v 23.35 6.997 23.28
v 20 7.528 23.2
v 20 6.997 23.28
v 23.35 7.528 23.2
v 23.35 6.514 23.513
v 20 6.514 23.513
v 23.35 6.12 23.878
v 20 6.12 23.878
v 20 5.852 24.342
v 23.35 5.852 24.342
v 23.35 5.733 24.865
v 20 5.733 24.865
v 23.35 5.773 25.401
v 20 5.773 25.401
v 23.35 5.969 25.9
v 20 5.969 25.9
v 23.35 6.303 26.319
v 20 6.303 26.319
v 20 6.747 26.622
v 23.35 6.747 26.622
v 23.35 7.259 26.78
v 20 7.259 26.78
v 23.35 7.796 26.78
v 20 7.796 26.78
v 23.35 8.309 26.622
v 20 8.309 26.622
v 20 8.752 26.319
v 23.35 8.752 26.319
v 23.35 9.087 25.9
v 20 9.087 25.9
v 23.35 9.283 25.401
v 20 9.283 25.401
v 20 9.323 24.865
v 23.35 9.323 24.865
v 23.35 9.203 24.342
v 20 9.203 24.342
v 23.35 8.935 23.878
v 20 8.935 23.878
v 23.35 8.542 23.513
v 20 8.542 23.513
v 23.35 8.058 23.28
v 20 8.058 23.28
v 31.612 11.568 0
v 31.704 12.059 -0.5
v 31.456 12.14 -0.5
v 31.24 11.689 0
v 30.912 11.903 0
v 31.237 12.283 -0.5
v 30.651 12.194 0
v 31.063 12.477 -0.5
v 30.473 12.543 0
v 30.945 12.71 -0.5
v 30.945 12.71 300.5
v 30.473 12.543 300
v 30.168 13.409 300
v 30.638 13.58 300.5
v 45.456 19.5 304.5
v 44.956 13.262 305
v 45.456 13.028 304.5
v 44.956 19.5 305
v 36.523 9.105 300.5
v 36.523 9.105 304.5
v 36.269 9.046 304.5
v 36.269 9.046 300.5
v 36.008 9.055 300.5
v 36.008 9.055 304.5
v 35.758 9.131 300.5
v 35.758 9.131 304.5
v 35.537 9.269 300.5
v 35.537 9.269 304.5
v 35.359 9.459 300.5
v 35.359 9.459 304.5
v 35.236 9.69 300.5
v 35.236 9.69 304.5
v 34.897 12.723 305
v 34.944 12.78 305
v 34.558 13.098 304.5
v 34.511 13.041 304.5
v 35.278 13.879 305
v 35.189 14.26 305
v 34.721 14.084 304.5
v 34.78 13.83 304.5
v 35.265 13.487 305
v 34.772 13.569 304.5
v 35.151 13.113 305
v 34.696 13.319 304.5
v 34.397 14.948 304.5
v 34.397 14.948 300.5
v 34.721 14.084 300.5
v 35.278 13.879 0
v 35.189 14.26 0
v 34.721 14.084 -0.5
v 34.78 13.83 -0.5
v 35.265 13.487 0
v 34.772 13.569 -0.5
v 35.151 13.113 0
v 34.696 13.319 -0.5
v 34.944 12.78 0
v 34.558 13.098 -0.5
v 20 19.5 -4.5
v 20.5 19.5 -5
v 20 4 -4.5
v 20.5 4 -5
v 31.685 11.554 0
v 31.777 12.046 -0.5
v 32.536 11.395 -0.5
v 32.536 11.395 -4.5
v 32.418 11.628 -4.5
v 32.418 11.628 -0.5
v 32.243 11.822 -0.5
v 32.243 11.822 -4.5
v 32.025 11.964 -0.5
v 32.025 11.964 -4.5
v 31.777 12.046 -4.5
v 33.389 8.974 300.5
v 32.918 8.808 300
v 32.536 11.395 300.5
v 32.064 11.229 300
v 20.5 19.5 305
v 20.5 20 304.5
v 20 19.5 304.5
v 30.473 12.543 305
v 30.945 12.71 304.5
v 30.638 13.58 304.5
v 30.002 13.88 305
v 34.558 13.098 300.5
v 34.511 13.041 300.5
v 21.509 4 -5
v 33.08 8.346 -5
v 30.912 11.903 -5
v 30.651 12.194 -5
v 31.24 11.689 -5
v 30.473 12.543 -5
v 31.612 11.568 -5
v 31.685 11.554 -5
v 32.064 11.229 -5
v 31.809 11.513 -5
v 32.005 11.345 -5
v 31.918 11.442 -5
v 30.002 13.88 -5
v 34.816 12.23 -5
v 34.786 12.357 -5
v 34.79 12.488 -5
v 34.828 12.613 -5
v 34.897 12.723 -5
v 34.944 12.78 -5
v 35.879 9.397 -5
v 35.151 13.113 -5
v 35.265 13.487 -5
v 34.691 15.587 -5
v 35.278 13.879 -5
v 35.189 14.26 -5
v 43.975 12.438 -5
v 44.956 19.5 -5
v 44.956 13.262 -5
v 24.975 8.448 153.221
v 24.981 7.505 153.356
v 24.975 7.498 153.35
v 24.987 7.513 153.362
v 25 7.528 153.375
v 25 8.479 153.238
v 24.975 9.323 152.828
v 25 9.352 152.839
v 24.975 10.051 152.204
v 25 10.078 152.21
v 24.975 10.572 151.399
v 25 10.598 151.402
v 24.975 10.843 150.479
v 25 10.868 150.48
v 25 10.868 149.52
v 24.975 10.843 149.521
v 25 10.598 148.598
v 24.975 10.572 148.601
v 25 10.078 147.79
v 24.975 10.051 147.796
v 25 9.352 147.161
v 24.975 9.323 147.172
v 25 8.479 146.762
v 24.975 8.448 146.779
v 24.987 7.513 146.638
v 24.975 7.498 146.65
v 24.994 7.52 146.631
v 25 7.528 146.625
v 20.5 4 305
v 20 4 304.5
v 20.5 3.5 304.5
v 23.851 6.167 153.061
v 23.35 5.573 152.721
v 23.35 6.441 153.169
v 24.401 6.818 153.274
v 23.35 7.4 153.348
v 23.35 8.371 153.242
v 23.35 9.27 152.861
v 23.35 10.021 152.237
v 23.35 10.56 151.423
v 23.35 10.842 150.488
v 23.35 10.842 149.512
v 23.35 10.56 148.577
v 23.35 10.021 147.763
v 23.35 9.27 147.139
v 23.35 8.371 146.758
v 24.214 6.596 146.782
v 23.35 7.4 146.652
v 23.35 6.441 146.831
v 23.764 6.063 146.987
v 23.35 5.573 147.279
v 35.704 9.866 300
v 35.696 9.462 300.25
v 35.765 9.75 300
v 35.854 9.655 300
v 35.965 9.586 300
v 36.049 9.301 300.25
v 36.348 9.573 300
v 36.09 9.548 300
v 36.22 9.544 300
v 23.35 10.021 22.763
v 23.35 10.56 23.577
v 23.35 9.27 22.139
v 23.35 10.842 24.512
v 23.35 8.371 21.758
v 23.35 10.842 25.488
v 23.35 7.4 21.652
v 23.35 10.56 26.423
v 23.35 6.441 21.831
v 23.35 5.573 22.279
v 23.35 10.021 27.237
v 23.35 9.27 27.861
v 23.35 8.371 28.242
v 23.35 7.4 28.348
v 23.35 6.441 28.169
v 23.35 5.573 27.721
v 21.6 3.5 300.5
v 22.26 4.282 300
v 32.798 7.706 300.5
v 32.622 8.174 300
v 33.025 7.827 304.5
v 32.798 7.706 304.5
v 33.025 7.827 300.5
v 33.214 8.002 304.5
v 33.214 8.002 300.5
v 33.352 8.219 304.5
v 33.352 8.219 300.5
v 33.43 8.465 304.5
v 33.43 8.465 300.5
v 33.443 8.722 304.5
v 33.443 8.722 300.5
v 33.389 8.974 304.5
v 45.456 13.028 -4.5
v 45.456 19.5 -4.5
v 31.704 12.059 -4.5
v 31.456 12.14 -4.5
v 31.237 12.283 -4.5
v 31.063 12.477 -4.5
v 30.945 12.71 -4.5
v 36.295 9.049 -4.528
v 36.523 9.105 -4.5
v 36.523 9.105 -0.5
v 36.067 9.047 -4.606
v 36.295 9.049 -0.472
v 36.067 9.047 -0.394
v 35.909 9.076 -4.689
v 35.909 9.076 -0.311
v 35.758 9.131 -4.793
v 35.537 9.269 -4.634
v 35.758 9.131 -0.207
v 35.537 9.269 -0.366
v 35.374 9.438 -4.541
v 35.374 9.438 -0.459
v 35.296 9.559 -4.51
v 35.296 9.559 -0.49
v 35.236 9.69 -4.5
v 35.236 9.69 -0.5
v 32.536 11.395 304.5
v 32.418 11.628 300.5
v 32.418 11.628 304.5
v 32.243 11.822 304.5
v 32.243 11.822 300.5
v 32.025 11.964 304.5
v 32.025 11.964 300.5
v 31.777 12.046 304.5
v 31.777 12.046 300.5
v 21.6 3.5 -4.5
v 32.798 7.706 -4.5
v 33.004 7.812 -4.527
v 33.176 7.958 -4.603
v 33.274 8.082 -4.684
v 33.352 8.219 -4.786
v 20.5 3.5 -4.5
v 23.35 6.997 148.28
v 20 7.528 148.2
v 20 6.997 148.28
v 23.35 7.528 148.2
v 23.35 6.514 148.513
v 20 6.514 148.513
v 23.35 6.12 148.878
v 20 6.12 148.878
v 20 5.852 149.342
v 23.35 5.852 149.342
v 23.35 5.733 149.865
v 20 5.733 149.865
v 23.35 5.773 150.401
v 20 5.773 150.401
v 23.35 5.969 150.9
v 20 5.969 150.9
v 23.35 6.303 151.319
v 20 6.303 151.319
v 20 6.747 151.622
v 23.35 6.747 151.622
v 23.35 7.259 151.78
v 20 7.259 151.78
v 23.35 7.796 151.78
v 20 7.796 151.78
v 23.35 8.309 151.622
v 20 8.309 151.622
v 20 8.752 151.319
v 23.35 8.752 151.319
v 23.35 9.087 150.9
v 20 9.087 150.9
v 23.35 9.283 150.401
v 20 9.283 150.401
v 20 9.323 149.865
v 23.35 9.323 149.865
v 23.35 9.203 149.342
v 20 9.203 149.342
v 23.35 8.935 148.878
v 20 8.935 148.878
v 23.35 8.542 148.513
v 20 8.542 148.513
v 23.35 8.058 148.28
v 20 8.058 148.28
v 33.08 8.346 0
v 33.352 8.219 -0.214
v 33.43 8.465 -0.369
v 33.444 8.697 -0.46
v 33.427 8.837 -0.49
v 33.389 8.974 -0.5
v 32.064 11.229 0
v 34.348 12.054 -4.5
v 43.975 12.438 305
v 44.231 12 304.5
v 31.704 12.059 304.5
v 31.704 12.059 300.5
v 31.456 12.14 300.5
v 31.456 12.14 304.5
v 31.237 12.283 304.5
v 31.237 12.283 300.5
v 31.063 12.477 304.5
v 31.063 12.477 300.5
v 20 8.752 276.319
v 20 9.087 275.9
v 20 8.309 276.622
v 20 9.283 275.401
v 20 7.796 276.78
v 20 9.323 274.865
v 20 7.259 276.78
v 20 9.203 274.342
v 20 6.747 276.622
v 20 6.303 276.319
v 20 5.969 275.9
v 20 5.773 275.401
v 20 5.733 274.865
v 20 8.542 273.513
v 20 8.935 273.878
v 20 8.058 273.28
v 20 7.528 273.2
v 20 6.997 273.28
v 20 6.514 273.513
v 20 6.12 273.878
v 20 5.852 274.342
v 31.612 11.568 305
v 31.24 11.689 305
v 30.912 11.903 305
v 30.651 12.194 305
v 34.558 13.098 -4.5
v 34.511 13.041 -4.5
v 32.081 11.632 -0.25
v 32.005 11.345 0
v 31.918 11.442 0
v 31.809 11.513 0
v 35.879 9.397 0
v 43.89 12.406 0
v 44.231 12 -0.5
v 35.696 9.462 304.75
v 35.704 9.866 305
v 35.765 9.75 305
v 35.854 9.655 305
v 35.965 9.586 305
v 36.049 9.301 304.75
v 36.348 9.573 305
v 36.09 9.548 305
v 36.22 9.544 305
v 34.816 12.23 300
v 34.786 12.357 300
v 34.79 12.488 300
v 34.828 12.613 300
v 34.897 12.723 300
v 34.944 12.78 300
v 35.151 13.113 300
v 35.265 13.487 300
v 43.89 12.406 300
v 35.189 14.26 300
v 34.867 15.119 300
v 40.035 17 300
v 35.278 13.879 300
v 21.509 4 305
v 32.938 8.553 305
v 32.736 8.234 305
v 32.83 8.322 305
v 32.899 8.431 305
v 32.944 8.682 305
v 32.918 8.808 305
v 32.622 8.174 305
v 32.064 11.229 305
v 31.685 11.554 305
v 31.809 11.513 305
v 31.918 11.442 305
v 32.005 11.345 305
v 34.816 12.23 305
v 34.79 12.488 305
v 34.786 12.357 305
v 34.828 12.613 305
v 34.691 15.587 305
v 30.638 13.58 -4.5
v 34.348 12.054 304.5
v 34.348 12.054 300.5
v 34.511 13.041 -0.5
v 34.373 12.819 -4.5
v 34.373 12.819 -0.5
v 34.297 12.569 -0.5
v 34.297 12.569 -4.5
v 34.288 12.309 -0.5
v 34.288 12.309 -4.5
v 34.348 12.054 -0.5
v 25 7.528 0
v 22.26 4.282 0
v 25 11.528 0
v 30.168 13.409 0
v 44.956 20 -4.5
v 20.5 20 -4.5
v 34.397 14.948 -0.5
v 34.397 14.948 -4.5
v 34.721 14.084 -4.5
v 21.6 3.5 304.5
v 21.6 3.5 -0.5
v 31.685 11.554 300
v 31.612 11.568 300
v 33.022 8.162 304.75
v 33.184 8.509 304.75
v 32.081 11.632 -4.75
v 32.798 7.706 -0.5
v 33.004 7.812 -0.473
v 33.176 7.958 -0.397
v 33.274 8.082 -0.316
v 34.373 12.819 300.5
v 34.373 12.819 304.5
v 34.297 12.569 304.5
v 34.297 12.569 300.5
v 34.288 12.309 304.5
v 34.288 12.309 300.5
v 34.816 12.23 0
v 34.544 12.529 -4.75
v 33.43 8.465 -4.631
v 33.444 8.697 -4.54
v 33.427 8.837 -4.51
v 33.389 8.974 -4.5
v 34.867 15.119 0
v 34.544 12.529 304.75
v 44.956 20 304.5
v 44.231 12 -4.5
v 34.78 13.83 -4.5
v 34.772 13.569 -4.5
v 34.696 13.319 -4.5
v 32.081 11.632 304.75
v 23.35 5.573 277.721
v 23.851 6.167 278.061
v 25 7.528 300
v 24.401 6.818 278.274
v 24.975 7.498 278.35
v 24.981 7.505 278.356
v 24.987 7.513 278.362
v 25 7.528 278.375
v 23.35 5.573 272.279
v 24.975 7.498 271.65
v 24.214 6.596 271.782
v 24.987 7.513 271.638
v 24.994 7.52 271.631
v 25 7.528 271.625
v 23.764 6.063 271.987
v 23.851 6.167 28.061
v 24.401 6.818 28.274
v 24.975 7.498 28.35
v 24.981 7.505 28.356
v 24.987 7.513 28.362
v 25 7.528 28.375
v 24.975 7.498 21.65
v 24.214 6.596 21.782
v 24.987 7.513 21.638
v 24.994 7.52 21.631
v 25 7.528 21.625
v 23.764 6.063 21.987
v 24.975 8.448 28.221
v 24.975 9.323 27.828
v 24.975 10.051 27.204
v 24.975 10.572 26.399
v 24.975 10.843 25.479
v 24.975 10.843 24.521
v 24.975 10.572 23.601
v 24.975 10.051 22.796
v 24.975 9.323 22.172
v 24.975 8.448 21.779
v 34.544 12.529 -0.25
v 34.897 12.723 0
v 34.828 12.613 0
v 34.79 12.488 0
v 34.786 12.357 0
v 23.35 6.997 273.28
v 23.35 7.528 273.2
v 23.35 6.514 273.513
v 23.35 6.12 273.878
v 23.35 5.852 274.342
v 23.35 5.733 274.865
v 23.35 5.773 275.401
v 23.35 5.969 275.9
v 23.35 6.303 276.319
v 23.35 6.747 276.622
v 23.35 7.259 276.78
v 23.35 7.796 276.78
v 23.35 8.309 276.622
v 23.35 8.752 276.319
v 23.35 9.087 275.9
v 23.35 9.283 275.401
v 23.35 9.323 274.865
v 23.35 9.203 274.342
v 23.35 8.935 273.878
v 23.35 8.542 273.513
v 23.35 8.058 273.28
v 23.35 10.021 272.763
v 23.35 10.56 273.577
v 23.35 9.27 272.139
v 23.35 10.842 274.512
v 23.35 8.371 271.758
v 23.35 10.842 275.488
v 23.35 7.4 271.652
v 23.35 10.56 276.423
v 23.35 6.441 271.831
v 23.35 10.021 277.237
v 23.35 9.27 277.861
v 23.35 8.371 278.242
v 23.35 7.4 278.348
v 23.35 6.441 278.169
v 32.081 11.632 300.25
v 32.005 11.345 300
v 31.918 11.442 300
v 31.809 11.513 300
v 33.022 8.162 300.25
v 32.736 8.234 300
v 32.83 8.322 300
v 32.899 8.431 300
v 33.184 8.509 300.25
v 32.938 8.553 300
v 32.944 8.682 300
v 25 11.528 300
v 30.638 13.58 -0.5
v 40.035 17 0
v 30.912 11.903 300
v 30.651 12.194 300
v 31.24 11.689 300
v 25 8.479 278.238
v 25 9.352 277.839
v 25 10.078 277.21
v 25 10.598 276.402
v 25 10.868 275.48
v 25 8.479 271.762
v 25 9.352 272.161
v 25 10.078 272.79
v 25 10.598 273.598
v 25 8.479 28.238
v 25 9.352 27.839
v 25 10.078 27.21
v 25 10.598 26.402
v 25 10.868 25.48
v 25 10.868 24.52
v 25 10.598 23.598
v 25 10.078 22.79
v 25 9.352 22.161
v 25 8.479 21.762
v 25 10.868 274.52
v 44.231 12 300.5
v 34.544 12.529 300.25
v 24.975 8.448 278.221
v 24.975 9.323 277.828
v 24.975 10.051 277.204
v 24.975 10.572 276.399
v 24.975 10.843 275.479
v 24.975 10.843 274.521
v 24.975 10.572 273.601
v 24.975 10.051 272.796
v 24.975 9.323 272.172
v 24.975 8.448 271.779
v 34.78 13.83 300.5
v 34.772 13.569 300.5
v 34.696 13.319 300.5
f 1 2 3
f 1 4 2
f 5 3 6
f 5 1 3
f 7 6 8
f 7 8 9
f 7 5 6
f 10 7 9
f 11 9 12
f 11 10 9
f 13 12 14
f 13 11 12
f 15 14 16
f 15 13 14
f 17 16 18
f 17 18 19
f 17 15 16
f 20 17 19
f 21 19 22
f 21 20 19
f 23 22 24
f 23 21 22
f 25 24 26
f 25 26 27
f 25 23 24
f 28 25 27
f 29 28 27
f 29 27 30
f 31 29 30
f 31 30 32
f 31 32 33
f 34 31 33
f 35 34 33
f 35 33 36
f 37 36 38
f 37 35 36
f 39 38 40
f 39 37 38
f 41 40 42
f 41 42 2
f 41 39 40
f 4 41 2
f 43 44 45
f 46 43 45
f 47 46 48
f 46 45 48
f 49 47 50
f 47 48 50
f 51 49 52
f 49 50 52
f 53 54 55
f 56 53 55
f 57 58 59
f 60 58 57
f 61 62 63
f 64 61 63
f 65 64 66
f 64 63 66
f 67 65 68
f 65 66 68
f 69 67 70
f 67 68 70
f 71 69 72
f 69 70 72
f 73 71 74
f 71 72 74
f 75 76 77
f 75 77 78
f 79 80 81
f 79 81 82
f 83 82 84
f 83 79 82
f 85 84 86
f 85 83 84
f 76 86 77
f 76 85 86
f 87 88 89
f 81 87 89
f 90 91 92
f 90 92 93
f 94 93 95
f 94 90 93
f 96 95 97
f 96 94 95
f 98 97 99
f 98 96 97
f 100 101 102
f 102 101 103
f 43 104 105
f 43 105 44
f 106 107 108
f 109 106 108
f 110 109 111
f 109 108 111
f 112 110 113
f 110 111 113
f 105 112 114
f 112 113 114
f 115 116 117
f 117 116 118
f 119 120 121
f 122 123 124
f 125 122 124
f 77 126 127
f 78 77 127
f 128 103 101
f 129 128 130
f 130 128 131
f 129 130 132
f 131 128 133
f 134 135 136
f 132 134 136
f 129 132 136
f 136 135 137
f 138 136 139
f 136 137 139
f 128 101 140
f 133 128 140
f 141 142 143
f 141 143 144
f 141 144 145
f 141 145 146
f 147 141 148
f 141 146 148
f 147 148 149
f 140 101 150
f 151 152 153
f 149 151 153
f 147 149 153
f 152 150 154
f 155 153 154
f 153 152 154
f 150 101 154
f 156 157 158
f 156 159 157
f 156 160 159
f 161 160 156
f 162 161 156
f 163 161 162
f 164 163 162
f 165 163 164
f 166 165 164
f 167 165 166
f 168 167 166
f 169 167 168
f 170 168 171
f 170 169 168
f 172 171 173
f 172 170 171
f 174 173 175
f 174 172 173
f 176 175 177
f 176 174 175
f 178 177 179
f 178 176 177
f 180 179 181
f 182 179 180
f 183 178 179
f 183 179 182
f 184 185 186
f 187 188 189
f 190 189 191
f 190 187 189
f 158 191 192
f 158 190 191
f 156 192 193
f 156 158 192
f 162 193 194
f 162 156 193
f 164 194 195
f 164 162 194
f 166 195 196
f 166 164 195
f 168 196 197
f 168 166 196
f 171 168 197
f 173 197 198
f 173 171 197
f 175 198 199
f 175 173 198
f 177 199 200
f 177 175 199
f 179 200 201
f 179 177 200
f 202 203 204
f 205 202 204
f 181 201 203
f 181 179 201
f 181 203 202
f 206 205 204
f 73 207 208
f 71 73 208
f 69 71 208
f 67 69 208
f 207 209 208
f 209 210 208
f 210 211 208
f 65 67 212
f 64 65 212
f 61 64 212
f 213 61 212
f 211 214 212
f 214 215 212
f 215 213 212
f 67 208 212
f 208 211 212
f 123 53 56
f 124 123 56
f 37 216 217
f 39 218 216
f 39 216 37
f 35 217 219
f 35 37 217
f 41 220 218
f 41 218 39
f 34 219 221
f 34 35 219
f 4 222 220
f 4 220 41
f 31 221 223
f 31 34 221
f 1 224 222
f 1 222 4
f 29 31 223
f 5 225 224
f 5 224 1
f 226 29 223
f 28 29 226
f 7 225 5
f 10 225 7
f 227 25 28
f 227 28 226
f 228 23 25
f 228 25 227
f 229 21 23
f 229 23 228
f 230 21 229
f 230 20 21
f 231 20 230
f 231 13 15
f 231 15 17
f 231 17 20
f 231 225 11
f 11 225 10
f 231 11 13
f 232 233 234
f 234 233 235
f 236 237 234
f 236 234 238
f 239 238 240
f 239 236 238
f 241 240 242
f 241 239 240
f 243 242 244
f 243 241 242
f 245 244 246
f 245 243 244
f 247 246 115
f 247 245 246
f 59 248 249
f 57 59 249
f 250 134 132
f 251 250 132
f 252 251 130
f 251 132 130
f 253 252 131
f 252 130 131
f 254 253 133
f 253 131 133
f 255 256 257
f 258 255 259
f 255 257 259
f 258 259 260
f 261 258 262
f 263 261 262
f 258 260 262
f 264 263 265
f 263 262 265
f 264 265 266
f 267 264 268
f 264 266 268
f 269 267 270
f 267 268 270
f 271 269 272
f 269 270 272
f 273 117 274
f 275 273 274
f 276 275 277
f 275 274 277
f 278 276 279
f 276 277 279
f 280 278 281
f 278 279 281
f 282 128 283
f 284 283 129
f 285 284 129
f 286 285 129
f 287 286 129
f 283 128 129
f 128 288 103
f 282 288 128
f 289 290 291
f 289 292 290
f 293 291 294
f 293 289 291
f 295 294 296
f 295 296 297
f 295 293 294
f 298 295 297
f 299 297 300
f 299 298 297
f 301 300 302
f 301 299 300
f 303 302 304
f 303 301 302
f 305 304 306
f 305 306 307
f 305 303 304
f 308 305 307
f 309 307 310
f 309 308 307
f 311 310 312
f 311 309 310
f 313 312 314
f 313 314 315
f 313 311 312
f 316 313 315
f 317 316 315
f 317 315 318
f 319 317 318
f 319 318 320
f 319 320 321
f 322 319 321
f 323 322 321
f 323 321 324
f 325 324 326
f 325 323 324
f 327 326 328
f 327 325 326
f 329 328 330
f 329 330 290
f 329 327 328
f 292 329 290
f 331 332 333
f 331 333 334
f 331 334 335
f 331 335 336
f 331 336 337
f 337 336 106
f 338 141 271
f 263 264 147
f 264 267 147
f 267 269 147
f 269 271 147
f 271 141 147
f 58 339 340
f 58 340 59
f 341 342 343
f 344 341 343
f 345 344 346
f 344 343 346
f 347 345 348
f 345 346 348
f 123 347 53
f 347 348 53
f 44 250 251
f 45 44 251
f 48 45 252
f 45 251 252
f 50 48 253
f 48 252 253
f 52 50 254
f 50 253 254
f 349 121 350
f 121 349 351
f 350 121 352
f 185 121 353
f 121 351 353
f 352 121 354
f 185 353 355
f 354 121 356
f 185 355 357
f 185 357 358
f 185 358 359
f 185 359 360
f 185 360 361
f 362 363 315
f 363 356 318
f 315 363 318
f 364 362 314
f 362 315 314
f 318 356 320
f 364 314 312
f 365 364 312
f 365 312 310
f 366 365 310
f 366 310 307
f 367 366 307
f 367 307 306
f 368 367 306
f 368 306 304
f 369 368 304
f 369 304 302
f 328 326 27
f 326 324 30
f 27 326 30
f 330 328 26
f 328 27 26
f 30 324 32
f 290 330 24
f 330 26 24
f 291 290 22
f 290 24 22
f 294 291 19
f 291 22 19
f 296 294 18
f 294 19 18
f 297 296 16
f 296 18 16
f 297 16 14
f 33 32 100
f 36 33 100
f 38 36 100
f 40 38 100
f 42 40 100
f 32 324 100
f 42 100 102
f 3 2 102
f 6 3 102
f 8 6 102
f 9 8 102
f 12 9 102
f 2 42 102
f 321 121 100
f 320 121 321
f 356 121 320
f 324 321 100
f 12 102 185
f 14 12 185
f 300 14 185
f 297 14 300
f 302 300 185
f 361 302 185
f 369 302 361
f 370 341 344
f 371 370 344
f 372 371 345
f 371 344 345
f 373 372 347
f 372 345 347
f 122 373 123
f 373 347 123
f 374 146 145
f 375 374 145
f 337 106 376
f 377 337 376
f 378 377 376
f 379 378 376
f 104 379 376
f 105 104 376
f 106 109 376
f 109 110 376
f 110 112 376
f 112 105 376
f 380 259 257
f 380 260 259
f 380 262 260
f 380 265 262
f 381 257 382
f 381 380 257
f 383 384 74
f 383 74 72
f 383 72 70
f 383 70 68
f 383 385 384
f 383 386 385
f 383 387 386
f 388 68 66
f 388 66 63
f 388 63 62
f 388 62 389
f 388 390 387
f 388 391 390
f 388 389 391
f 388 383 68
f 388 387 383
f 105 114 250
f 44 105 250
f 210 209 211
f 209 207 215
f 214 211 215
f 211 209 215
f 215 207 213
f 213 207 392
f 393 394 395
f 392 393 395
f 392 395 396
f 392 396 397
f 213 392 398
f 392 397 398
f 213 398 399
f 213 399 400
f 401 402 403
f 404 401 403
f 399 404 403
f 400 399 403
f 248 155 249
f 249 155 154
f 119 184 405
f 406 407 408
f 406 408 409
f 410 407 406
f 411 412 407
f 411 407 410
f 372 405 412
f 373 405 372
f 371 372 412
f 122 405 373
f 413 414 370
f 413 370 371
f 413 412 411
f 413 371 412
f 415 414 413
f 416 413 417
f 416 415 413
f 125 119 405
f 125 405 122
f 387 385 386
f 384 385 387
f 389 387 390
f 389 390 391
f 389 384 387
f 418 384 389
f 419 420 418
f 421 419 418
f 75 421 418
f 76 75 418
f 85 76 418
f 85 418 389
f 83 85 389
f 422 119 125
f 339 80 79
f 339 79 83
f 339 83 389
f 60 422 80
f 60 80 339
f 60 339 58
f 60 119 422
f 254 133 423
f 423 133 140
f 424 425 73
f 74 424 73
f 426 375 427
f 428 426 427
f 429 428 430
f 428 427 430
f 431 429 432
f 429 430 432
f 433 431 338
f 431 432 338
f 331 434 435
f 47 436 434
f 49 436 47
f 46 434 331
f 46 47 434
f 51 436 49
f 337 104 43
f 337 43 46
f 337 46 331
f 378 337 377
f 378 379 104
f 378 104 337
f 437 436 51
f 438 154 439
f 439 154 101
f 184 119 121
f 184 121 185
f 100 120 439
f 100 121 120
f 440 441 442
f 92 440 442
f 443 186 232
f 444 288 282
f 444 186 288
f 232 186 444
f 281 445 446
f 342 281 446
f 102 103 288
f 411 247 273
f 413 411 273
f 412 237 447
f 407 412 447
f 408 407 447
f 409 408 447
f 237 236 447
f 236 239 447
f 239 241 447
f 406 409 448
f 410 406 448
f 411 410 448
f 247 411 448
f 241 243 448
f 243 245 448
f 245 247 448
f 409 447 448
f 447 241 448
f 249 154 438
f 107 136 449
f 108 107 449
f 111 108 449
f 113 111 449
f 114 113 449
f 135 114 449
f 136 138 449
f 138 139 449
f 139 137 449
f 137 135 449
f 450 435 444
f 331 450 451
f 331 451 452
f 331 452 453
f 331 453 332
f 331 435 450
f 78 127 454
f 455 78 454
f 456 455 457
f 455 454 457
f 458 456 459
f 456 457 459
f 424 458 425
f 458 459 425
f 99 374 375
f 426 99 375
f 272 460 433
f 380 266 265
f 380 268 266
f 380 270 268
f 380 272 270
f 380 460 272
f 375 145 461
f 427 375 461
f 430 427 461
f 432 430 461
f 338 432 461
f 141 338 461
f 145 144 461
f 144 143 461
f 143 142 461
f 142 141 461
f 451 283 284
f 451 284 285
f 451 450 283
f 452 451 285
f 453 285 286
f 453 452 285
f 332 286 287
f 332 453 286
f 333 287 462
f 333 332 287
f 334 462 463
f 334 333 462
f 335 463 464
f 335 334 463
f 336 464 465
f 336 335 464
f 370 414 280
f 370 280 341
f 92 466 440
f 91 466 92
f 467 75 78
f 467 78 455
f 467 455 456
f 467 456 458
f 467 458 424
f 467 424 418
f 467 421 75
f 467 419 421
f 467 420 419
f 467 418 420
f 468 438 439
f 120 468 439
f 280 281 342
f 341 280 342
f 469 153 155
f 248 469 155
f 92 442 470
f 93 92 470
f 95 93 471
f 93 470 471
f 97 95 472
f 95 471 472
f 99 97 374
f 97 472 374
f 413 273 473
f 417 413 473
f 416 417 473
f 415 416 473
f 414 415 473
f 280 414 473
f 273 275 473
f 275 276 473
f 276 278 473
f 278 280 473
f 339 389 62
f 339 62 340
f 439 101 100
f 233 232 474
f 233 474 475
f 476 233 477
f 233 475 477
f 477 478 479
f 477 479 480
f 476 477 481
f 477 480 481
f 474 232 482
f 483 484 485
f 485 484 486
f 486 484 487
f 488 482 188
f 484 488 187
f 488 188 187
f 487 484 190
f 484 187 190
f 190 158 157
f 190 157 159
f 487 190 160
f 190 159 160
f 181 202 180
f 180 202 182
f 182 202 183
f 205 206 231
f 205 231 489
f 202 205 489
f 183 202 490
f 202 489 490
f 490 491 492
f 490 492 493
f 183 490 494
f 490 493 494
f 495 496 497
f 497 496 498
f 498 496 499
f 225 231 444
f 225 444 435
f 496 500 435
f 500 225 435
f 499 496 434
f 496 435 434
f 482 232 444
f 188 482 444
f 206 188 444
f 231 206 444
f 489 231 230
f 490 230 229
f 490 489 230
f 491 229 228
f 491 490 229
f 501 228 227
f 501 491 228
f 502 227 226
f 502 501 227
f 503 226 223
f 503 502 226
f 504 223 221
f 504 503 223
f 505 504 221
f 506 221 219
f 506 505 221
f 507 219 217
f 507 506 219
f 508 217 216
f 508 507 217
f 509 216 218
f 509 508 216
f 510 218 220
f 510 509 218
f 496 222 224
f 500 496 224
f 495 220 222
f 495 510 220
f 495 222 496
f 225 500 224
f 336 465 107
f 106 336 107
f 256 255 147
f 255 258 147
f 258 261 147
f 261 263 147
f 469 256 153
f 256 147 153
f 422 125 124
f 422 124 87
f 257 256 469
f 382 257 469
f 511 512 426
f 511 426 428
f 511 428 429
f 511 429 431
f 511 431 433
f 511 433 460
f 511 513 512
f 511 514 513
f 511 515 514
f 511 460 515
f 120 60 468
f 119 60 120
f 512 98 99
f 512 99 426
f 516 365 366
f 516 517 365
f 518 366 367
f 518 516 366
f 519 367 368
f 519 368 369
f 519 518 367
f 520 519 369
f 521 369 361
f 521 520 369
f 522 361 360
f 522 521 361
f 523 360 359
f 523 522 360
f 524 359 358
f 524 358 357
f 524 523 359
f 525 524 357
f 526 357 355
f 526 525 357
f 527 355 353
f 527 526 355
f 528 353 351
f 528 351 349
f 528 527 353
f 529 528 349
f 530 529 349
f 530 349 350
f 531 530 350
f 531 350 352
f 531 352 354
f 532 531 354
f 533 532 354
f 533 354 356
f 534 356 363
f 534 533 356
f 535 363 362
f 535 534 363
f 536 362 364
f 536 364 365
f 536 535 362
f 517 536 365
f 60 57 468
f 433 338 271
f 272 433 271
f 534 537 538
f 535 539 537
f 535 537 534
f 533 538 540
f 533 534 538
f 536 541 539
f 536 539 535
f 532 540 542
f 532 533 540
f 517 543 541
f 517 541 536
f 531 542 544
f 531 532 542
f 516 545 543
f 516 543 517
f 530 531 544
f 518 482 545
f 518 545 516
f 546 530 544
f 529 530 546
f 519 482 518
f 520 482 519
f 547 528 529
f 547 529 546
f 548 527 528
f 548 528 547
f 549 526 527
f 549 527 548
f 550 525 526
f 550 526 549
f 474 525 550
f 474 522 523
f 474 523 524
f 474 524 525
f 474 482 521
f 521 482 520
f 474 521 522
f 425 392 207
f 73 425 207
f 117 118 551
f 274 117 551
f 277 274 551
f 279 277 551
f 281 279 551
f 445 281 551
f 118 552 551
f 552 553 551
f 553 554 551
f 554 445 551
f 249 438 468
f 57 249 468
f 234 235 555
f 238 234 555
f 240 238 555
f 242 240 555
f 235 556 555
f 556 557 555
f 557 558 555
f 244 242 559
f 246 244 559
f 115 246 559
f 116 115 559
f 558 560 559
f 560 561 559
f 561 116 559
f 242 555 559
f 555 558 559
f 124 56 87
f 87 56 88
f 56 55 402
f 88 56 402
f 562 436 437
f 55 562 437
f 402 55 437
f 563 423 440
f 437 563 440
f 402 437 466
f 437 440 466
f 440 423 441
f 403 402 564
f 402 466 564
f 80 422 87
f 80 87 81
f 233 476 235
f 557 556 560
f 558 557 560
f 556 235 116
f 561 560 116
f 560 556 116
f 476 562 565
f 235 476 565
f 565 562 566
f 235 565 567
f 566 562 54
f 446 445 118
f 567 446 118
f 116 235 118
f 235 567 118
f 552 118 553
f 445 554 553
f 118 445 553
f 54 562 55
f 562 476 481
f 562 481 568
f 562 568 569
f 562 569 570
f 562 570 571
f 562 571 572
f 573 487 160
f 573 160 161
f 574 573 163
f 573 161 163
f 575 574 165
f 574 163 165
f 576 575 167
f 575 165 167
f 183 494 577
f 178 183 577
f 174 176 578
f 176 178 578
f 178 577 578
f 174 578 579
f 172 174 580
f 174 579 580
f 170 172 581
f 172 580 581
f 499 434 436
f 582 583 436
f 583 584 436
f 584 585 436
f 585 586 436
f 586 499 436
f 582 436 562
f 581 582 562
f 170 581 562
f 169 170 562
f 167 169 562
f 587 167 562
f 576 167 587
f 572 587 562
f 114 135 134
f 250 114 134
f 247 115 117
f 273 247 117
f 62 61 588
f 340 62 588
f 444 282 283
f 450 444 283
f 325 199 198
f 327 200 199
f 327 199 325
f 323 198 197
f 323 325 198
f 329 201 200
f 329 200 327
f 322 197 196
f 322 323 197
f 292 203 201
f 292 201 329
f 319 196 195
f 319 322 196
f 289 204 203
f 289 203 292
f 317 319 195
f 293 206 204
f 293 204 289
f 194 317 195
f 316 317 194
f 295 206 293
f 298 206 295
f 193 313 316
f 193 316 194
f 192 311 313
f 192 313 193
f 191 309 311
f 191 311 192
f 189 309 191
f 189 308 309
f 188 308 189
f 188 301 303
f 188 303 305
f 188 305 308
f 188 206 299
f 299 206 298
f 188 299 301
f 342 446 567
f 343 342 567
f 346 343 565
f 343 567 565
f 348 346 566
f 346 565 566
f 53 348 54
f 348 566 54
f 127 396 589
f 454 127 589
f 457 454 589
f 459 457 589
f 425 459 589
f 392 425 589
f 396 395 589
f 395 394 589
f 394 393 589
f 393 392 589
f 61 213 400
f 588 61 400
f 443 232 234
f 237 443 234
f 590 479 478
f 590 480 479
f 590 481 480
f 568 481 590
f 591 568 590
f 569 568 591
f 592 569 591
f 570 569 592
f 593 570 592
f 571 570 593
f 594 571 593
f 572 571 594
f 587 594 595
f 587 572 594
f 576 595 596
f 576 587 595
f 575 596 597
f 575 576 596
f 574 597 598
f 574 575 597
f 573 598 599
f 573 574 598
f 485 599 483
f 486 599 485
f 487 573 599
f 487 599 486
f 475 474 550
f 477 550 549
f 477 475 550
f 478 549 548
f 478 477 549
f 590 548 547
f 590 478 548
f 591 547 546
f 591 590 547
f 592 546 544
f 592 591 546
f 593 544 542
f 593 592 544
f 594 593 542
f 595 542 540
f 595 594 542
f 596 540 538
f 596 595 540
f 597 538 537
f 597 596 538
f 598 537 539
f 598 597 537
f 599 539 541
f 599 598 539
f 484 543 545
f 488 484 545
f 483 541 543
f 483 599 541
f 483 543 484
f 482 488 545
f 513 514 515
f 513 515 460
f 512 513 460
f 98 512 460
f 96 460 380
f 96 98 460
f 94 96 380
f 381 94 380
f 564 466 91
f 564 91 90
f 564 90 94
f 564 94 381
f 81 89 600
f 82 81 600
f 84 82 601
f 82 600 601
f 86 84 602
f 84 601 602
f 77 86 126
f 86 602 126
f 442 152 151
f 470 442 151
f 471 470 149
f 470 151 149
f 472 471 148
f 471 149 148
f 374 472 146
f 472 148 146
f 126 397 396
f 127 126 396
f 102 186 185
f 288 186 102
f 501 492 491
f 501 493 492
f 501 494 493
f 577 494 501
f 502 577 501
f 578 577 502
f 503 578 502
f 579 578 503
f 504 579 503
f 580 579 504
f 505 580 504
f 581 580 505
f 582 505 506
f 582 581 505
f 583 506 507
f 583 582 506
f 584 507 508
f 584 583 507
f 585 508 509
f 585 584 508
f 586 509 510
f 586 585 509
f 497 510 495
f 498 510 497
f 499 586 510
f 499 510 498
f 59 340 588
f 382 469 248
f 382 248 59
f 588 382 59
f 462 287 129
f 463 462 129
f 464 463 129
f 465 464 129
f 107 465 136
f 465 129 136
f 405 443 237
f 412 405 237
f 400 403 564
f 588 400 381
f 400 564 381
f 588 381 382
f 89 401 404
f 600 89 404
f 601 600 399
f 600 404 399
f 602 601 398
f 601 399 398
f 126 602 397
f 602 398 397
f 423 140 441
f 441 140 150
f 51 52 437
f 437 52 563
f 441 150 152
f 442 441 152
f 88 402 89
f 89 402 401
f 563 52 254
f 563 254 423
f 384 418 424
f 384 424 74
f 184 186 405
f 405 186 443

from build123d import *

# Parameters (mm, degrees)
BOSS_EXTRUDE1_DEPTH            = 300
CBORE_FOR_M3_SBHCS1_AT_2_COUNT = 2
CBORE_FOR_M3_SBHCS1_AT_2_PITCH = 124.99999999999997
CBORE_FOR_M3_SBHCS1_AT_3_COUNT = 2
CBORE_FOR_M3_SBHCS1_AT_3_PITCH = 249.99999999999997
BOSS_EXTRUDE2_DEPTH            = 5
FILLET1_R                      = 1
LPATTERN1_COUNT                = 2
LPATTERN1_PITCH                = 305
CHAMFER2_SIZE                  = 0.5
FILLET2_R                      = 1


with BuildPart() as part:
    # Sketch1 → Boss-Extrude1 (new body)
    with BuildSketch(Plane.XY):
        Polygon((20, 20), (20, 3.5), (21.600000000000005, 3.5), (24.999999999999996, 7.527677706789349), (25.000000000000004, 11.52767770678935), (40.03508193257454, 17), (44.2305800884609, 12), (45.45625119745129, 13.028460175498461), (45.456251197451294, 20), align=None)
    extrude(amount=BOSS_EXTRUDE1_DEPTH)

    # Sketch4 → CBORE for M3 SBHCS1 (revolve, cut)
    with BuildSketch(Plane(origin=(25, 7.527677706789349, 274.99999999999994), x_dir=(0, 0, -1), z_dir=(2.31e-15, 1, 0))):
        Polygon((0, 0), (-1.22e-15, 5.000000000000024), (1.7999999999999992, 5.000000000000024), (1.8000000000000005, 1.6499999999999997), (3.3499999999999956, 1.6499999999999952), (3.350000000000001, 0.02499999999999889), (3.3749999999999996, -3.47e-15), align=None)
    cbore_for_m3_sbhcs1 = revolve(axis=Axis((31.34999999999999, 7.527677706789334, 274.99999999999994), (-1, 2.32e-15, 0)), mode=Mode.SUBTRACT)

    # CBORE for M3 SBHCS1 at 2: CBORE for M3 SBHCS1 ×2
    with Locations(*[(0, 0, -i * CBORE_FOR_M3_SBHCS1_AT_2_PITCH) for i in range(1, CBORE_FOR_M3_SBHCS1_AT_2_COUNT)]):
        add(cbore_for_m3_sbhcs1, mode=Mode.SUBTRACT)

    # CBORE for M3 SBHCS1 at 3: CBORE for M3 SBHCS1 ×2
    with Locations(*[(0, 0, -i * CBORE_FOR_M3_SBHCS1_AT_3_PITCH) for i in range(1, CBORE_FOR_M3_SBHCS1_AT_3_COUNT)]):
        add(cbore_for_m3_sbhcs1, mode=Mode.SUBTRACT)

    # Sketch5 → Boss-Extrude2 (add)
    with BuildSketch(Plane.XY.offset(300)):
        with BuildLine():
            Line((24.999999999999996, 7.527677706789349), (21.600000000000005, 3.5))
            Line((21.600000000000005, 3.5), (33.71474845278774, 8.05027495743257))
            Line((33.71474845278774, 8.050274957432569), (33.70794748463962, 8.069572384153874))
            Line((33.70794748463962, 8.069572384153874), (32.53600076787437, 11.394915981634217))
            ThreePointArc((32.53600076787437, 11.394915981634217), (32.24344854430553, 11.821955076935874), (31.77657133911045, 12.045505670091789))
            Line((31.77657133911045, 12.045505670091789), (31.704265005172275, 12.059019247038602))
            ThreePointArc((31.704265005172275, 12.0590192470386), (31.23738779997721, 12.282569840194535), (30.94483557640838, 12.70960893549619))
            Line((30.94483557640838, 12.70960893549619), (30.638155724715453, 13.57979856674334))
            Line((30.638155724715453, 13.579798566743342), (25.000000000000004, 11.52767770678935))
            Line((25.000000000000004, 11.52767770678935), (24.999999999999996, 7.527677706789349))
        make_face()
        with BuildLine():
            Line((34.34750801297435, 12.054250698008177), (35.587234405375604, 8.753576884947558))
            Line((35.587234405375604, 8.753576884947558), (44.2305800884609, 12))
            Line((44.2305800884609, 12), (40.03508193257454, 17))
            Line((40.03508193257454, 17), (34.396926207859096, 14.947879140046009))
            Line((34.396926207859096, 14.947879140046007), (34.721342924696536, 14.084145199760654))
            ThreePointArc((34.721342924696536, 14.084145199760654), (34.77173035882119, 13.568965329313977), (34.5577772215813, 13.097612756926463))
            Line((34.5577772215813, 13.097612756926463), (34.511073716089605, 13.04078314084238))
            ThreePointArc((34.511073716089605, 13.04078314084238), (34.297120578849714, 12.569430568454859), (34.34750801297435, 12.054250698008177))
        make_face()
        Polygon((20, 3.5), (21.600000000000005, 3.5), (24.999999999999996, 7.527677706789349), (25.000000000000004, 11.52767770678935), (30.638155724715453, 13.579798566743342), (34.396926207859096, 14.947879140046007), (40.03508193257454, 17), (44.2305800884609, 12), (45.45625119745129, 13.028460175498461), (45.456251197451294, 20), (20, 20), align=None)
    boss_extrude2 = extrude(amount=BOSS_EXTRUDE2_DEPTH)

    # Fillet1
    fillet1_edges = [part.edges().sort_by_distance(p)[0] for p in [
        (35.587234405375604, 8.753576884947558, 302.5),
        (33.71474845278774, 8.05027495743257, 302.5),
    ]]
    fillet(fillet1_edges, radius=FILLET1_R)

    # LPattern1: Boss-Extrude2 ×2
    with Locations(*[(0, 0, -i * LPATTERN1_PITCH) for i in range(1, LPATTERN1_COUNT)]):
        add(boss_extrude2)

    # Chamfer2
    chamfer2_edges = [part.edges().sort_by_distance(p)[0] for p in [
        (33.35225539318084, 8.219308247155407, 300),
        (40.37697975127303, 10.552595526139491, 305),
        (35.758439525002586, 9.13075281507476, 305),
        (33.35225539318084, 8.219308247155407, 305),
        (40.37697975127303, 10.552595526139491, 300),
        (35.758439525002586, 9.13075281507476, 300),
        (34.55913456627782, 14.51601216990333, 0),
        (34.53442546883545, 13.069197948884423, 0),
        (34.96737120917498, 10.403913791477867, 0),
        (39.90890724691825, 10.376788442473778, 0),
        (27.65737422639387, 5.775137478716285, 0),
        (32.24344854430553, 11.821955076935874, 0),
        (31.74041817214136, 12.052262458565195, 0),
        (31.23738779997721, 12.282569840194535, 0),
        (30.791495650561917, 13.144703751119765, 0),
        (32.51754096628727, 14.263838853394676, -5),
        (34.55913456627782, 14.51601216990333, -5),
        (34.77173035882119, 13.56896532931398, 0),
        (34.53442546883545, 13.069197948884423, -5),
        (34.297120578849714, 12.569430568454859, 0),
        (34.96737120917498, 10.403913791477867, -5),
        (39.90890724691825, 10.376788442473778, -5),
        (44.84341564295609, 12.51423008774923, -5),
        (45.45625119745129, 16.51423008774923, -5),
        (32.72812559872565, 20, -5),
        (20, 11.75, -5),
        (20.800000000000004, 3.5, -5),
        (27.65737422639387, 5.775137478716285, -5),
        (33.12537461033105, 9.722595469533394, 0),
        (32.24344854430553, 11.821955076935874, -5),
        (31.74041817214136, 12.052262458565195, -5),
        (31.23738779997721, 12.282569840194535, -5),
        (30.791495650561917, 13.144703751119765, -5),
        (33.12537461033105, 9.722595469533394, -5),
        (34.297120578849714, 12.569430568454859, -5),
        (34.77173035882119, 13.56896532931398, -5),
        (45.456251197451294, 20, 150),
        (20, 3.5, 150),
        (20, 20, 150),
        (30.791495650561917, 13.144703751119765, 300),
        (32.9625451430224, 10.184616411996103, 300),
        (34.297120578849714, 12.569430568454859, 300),
        (34.77173035882119, 13.56896532931398, 300),
        (30.791495650561917, 13.144703751119765, 305),
        (34.55913456627782, 14.51601216990333, 300),
        (34.77173035882119, 13.56896532931398, 305),
        (34.53442546883545, 13.069197948884423, 300),
        (34.297120578849714, 12.569430568454859, 305),
        (34.79156412550927, 10.871986295832649, 300),
        (27.19878088673786, 5.602890750093377, 300),
        (32.9625451430224, 10.184616411996103, 305),
        (32.24344854430553, 11.821955076935874, 300),
        (31.74041817214136, 12.052262458565195, 300),
        (31.23738779997721, 12.282569840194535, 300),
        (32.51754096628727, 14.263838853394676, 305),
        (34.55913456627782, 14.51601216990333, 305),
        (34.53442546883545, 13.069197948884423, 305),
        (34.79156412550927, 10.871986295832649, 305),
        (44.84341564295609, 12.51423008774923, 305),
        (45.45625119745129, 16.51423008774923, 305),
        (32.72812559872565, 20, 305),
        (20, 11.75, 305),
        (20.800000000000004, 3.5, 305),
        (27.19878088673786, 5.602890750093377, 305),
        (32.24344854430553, 11.821955076935874, 305),
        (31.74041817214136, 12.052262458565195, 305),
        (31.23738779997721, 12.282569840194535, 305),
    ]]
    chamfer(chamfer2_edges, length=CHAMFER2_SIZE)

    # Fillet2
    fillet2_edges = [part.edges().sort_by_distance(p)[0] for p in [
        (35.587234405375604, 8.753576884947558, -2.5),
        (33.71474845278774, 8.05027495743257, -2.5),
    ]]
    fillet(fillet2_edges, radius=FILLET2_R)


solid = part.part
